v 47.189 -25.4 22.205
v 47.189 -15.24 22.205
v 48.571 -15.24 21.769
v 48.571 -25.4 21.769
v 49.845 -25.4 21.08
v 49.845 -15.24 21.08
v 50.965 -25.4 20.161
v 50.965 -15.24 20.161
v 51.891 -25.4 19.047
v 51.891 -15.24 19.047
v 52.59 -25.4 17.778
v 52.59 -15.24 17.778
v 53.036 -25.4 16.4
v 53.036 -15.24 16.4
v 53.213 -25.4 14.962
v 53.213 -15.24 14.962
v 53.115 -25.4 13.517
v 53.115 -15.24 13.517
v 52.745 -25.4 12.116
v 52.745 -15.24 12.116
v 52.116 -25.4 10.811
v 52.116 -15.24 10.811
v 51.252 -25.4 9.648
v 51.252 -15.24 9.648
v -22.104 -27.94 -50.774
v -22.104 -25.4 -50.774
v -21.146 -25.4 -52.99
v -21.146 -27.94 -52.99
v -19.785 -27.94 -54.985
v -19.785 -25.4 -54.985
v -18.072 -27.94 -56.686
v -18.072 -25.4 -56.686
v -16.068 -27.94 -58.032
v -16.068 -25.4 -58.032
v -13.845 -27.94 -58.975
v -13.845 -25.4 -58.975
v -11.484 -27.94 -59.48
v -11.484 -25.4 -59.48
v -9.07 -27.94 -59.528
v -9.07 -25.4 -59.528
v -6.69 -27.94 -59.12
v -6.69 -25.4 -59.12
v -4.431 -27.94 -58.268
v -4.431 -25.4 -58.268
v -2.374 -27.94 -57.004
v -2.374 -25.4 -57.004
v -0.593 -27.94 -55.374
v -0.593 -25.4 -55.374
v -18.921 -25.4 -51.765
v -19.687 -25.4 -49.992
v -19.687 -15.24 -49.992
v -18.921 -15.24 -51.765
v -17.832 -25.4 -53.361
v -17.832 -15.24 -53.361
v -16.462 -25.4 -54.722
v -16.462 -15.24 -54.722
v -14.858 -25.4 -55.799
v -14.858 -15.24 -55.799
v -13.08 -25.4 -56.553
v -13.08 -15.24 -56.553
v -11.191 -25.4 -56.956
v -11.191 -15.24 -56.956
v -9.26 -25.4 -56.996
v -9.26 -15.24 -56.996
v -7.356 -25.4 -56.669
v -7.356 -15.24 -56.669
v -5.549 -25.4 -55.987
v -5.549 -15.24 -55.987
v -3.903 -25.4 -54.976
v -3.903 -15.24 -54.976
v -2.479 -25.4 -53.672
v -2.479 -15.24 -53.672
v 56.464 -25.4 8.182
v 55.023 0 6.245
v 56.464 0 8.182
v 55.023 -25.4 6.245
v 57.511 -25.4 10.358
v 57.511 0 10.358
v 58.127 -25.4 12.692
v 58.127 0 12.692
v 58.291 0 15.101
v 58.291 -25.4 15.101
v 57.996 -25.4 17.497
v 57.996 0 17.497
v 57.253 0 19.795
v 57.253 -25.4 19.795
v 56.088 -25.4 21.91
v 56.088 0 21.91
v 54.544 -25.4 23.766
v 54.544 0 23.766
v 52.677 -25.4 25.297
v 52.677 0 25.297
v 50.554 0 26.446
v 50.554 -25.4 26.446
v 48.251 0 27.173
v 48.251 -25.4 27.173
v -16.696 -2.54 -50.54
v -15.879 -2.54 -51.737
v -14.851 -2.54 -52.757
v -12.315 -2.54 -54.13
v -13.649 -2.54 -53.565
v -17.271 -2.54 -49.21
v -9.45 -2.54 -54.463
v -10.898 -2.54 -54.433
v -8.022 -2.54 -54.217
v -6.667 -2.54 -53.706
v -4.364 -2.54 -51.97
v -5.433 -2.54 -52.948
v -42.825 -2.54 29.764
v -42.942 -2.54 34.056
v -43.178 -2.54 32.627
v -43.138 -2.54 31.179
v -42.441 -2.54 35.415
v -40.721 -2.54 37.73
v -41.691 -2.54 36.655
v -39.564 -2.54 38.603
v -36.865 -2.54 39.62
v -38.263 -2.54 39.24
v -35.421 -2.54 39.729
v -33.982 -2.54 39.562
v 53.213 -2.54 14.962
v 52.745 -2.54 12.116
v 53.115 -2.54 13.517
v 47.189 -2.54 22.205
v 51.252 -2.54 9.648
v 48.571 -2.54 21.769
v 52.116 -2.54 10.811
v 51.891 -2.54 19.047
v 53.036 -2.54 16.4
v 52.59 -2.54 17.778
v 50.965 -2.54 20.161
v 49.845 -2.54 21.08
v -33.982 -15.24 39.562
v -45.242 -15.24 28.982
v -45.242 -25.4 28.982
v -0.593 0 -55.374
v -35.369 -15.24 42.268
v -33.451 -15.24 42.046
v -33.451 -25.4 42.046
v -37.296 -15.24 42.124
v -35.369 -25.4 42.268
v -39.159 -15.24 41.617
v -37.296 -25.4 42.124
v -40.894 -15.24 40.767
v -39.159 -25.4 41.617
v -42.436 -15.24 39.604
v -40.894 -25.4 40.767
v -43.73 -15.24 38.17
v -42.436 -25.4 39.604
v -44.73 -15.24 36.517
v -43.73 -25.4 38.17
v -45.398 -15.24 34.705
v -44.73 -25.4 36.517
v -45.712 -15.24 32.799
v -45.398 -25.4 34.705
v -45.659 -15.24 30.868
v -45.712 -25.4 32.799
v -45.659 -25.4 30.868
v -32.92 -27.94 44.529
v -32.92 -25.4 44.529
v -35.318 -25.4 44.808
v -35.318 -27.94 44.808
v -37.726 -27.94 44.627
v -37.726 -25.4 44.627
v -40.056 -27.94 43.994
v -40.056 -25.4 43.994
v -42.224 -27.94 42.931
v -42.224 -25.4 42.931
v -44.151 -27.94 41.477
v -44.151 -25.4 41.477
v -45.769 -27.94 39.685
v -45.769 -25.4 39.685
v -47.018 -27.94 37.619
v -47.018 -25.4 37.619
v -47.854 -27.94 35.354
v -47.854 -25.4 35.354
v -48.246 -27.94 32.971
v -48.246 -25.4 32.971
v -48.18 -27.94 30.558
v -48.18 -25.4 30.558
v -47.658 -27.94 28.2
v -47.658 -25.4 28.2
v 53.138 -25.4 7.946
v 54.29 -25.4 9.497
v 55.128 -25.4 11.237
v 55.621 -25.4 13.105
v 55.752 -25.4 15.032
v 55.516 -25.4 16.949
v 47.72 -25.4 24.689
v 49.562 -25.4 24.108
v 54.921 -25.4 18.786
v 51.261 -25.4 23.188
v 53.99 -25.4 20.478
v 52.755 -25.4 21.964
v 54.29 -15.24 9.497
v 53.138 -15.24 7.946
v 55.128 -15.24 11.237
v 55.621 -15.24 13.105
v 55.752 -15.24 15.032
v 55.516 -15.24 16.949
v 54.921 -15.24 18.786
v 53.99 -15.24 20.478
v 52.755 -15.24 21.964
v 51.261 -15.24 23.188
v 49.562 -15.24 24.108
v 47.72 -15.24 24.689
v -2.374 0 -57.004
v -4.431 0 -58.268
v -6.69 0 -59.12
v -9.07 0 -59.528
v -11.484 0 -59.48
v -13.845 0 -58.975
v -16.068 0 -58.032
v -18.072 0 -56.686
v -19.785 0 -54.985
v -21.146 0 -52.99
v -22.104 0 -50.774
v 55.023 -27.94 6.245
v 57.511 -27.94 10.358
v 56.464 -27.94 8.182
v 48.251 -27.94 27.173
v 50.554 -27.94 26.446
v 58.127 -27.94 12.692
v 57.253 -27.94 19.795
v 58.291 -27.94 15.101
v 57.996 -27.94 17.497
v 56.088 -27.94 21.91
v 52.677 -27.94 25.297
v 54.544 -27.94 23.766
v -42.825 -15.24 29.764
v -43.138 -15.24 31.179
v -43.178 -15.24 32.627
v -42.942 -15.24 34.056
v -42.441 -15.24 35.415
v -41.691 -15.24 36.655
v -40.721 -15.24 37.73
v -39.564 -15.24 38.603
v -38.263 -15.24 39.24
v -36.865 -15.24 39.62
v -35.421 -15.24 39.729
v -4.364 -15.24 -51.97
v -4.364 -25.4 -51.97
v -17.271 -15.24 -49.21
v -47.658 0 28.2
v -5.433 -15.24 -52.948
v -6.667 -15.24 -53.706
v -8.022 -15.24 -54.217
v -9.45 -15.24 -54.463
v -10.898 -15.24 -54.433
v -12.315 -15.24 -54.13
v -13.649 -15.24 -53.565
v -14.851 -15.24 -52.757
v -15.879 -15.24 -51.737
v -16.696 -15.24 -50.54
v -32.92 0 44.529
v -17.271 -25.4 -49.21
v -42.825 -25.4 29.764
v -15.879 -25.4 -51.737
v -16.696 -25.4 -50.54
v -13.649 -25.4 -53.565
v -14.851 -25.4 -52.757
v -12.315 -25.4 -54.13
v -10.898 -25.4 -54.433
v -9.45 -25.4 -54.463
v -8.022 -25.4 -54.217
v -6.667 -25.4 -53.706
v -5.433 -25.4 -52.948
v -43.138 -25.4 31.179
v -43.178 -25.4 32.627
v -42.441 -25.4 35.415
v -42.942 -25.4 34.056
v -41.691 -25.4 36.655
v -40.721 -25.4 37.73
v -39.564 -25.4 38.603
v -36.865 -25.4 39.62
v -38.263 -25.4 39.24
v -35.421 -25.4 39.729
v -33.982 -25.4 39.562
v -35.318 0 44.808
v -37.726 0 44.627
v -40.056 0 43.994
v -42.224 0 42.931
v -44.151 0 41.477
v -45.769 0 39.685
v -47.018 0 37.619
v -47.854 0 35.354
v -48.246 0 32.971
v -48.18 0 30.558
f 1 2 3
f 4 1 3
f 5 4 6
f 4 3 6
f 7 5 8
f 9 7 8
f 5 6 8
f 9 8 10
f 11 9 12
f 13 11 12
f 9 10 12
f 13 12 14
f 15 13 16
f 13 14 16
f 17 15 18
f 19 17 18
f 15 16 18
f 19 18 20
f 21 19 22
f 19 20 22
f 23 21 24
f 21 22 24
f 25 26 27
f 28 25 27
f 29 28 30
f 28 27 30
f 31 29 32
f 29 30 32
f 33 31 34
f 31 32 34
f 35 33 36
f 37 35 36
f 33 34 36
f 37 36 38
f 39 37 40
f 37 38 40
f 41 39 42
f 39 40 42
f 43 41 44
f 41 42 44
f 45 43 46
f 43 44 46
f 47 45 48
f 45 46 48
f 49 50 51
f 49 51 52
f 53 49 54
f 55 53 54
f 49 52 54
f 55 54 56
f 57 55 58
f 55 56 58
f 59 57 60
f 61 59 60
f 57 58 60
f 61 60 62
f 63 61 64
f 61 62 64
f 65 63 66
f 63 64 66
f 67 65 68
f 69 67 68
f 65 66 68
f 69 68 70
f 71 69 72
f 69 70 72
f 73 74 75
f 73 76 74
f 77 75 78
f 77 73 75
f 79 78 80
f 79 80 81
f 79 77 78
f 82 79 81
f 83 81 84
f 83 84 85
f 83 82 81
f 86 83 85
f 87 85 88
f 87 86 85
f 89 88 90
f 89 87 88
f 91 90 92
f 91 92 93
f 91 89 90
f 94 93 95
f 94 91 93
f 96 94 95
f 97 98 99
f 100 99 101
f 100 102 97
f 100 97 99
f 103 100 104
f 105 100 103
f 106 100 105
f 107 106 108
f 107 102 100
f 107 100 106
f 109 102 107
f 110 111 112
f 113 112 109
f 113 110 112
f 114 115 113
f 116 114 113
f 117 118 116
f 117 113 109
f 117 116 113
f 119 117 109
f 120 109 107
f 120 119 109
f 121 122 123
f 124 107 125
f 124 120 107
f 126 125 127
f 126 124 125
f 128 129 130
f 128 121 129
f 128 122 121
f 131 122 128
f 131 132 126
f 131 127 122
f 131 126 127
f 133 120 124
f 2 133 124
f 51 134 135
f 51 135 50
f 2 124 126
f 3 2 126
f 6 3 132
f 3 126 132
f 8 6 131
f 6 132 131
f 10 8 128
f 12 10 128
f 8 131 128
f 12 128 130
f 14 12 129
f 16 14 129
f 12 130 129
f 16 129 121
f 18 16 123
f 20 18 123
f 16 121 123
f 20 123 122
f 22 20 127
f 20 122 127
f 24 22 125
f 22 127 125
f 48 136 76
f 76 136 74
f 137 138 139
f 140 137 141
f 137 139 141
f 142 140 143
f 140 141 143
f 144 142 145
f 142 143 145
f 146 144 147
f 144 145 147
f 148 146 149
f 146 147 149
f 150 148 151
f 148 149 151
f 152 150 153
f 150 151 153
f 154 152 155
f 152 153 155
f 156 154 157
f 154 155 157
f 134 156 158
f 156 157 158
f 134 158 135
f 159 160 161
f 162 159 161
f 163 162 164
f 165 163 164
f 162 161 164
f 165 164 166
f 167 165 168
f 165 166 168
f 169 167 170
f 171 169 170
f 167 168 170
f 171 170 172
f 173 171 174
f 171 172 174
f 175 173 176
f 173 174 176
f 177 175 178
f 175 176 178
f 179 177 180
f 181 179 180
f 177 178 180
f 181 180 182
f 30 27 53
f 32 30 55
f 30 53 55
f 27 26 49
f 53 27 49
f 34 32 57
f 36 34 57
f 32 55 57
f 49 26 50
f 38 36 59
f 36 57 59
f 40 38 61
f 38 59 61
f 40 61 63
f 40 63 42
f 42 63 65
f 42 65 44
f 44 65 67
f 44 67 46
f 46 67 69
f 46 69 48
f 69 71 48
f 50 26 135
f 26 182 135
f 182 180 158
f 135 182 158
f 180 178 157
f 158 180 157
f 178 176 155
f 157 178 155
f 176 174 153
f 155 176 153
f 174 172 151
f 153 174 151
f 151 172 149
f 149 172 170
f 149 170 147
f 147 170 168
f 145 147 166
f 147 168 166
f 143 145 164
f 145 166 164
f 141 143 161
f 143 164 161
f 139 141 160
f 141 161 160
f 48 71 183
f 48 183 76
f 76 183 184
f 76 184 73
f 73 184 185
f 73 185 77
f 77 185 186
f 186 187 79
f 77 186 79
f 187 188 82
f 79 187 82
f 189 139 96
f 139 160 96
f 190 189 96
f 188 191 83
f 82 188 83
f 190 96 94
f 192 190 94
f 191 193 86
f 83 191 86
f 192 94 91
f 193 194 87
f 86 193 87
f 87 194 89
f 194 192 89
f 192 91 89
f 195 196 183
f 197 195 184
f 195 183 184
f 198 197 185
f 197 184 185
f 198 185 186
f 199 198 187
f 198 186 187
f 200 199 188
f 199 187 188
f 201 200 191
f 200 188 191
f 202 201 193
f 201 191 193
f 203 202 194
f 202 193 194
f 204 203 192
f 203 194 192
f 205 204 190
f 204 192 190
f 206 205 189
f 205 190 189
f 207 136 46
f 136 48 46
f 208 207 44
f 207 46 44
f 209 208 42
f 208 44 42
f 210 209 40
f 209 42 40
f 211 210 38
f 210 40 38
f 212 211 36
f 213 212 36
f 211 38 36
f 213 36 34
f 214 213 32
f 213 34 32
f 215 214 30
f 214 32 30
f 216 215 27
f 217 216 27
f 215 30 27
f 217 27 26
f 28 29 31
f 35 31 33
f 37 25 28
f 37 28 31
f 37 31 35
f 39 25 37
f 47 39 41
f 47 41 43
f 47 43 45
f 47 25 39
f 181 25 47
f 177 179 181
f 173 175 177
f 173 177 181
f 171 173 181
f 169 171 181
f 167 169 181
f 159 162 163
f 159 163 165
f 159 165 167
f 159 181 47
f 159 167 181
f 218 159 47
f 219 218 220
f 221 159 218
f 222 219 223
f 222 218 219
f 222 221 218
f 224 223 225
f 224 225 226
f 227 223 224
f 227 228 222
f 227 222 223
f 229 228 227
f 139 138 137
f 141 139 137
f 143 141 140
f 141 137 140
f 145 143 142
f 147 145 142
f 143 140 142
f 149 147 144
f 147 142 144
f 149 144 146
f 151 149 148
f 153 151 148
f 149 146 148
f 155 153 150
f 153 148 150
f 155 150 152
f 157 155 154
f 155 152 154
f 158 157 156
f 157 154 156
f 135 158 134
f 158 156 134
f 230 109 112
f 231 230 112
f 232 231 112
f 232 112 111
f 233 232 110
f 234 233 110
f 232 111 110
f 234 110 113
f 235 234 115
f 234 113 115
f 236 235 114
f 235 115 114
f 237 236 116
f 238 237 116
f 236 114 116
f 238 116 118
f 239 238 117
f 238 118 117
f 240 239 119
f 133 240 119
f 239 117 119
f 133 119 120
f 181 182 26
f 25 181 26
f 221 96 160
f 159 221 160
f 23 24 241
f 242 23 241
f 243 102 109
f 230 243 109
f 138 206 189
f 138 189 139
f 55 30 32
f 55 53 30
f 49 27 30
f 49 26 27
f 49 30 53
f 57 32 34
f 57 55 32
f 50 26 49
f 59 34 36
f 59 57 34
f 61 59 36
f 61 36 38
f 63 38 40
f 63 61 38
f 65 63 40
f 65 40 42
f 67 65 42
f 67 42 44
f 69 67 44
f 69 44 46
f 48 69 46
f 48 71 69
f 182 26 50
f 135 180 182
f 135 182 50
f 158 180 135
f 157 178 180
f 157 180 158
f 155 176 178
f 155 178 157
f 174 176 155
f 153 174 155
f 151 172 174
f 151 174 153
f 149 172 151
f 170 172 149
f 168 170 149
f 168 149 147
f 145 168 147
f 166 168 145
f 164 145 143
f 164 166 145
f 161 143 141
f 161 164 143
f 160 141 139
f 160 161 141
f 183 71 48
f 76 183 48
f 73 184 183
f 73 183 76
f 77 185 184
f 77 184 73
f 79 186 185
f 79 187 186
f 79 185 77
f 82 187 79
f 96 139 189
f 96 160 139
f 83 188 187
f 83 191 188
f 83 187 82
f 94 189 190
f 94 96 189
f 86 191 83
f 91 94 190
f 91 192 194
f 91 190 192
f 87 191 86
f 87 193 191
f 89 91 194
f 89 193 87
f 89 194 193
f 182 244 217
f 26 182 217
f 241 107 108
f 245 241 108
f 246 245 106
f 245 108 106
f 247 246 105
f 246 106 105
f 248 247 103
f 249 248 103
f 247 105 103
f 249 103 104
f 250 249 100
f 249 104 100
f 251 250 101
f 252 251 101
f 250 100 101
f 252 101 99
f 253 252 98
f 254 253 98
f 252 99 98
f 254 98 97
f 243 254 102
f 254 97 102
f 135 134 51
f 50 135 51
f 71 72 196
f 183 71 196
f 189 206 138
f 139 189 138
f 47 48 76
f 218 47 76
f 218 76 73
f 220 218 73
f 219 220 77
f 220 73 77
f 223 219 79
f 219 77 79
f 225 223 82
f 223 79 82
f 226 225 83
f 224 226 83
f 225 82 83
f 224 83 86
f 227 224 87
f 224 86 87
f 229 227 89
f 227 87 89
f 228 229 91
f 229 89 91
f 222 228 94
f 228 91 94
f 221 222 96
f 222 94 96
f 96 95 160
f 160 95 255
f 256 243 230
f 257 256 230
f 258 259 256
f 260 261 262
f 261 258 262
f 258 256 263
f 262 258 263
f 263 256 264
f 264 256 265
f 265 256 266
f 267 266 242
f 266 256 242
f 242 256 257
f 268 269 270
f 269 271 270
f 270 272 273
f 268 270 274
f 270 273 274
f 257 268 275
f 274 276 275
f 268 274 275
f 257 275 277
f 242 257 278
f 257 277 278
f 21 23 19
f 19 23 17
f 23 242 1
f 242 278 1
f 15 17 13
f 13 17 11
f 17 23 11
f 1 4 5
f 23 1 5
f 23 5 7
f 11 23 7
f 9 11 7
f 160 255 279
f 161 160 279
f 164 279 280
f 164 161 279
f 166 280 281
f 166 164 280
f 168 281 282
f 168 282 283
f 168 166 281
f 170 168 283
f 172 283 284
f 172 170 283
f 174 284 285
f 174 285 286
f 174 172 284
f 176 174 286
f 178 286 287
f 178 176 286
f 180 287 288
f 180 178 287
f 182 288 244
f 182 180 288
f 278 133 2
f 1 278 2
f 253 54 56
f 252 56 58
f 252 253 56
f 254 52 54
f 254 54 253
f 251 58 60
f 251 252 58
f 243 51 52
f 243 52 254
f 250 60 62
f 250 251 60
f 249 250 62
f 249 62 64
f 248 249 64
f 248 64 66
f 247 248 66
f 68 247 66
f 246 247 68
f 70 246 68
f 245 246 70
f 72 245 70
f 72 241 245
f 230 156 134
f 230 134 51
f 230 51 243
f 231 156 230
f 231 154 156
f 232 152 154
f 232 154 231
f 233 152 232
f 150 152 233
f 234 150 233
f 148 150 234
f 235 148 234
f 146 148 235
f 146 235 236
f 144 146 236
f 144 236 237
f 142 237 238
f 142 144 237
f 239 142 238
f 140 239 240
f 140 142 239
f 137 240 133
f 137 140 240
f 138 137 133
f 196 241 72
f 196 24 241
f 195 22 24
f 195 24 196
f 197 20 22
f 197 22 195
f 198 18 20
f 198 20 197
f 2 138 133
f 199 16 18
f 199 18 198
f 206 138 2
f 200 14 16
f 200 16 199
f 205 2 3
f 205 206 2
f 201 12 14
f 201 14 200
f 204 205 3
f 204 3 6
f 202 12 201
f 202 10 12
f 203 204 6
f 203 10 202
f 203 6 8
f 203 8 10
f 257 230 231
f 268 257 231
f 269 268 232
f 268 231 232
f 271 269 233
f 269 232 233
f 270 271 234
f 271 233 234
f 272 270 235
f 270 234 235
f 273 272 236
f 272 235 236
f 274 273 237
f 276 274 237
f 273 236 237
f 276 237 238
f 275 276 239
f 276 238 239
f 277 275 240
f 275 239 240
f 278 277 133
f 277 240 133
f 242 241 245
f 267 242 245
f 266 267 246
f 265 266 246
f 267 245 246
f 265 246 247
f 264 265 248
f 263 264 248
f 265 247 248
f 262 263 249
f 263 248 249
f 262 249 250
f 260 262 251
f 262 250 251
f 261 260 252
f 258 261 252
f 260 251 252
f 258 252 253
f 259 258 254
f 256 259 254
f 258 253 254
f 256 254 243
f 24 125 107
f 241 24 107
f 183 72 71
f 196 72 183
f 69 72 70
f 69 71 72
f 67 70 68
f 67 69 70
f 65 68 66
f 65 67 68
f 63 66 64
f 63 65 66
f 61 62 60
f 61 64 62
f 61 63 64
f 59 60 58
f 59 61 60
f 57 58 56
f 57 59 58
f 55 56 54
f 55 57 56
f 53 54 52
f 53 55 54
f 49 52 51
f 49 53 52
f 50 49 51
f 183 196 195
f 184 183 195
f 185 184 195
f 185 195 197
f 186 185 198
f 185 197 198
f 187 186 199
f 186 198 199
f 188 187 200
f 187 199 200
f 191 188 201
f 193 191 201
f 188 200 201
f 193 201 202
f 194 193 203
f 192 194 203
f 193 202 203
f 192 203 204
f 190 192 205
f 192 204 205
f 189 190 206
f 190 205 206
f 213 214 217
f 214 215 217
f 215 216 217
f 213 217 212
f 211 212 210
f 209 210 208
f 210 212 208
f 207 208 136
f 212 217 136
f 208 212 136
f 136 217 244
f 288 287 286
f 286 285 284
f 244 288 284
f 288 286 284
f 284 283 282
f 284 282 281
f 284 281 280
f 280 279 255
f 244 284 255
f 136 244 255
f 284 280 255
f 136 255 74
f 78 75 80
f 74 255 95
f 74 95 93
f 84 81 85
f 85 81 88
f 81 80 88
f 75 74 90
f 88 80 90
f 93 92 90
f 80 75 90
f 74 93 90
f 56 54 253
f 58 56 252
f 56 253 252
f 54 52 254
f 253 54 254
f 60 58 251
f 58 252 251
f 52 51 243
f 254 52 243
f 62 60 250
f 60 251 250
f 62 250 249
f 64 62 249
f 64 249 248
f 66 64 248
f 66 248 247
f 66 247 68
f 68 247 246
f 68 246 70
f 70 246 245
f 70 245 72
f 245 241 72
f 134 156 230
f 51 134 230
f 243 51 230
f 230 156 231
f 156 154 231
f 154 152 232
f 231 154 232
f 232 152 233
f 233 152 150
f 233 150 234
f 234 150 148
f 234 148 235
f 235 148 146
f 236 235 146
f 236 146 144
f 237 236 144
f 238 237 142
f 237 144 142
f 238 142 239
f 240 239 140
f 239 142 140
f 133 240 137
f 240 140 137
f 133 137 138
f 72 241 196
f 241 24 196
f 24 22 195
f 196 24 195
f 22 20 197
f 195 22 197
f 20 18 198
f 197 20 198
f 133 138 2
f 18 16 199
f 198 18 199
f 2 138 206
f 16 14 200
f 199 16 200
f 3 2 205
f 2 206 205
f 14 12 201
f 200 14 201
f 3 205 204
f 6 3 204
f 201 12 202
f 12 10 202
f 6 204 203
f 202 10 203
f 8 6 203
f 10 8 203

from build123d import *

# Parameters (mm, degrees)
F0_DEPTH = 25.4
F1_R     = 12.7
F2_T     = -2.54
F4_DEPTH = 12.7
F7_DEPTH = 10.16
F9_DEPTH = 2.54


# Not quite as in the source:
# - a feature of the source that left no trace in its solid (it failed there, or was rolled back) is left out


with BuildPart() as f0:
    # F6 (on Front) → F0 (new body)
    with BuildSketch(Plane.XZ):
        Polygon((-15.3317583938, -71.7026534927), (69.7621986403, 22.5736344926), (-54.4304402465, 49.129019), align=None)
    extrude(amount=F0_DEPTH)

    # F1
    f1_edges = [f0.edges().sort_by_distance(p)[0] for p in [
        (69.762199, -12.7, 22.573634),
        (-15.331758, -12.7, -71.702653),
        (-54.43044, -12.7, 49.129019),
    ]]
    fillet(f1_edges, radius=F1_R)

    # F2
    f2_openings = [f0.faces().sort_by_distance(p)[0] for p in [
        (0, -25.4, 0),
    ]]
    offset(amount=F2_T, openings=f2_openings)

    # F3 (on face) → F4 (join)
    with BuildSketch(Plane.XZ.offset(2.54)):
        with BuildLine():
            ThreePointArc((-19.6872152917, -49.9920202635), (-12.1451122529, -56.7995368262), (-2.4785784535, -53.671642278))
            Line((-2.4785784535, -53.671642278), (53.1379671806, 7.9463815593))
            ThreePointArc((53.1379671806, 7.9463815593), (55.2623979412, 17.8817926703), (47.7202949023, 24.689309233))
            Line((47.7202949023, 24.689309233), (-33.4507518888, 42.0456387041))
            ThreePointArc((-33.4507518888, 42.0456387041), (-43.1172856883, 38.9177441559), (-45.2417164489, 28.982333045))
            Line((-45.2417164489, 28.982333045), (-19.6872152917, -49.9920202635))
        make_face()
        with BuildLine():
            Line((-17.2705818419, -49.2100466265), (-42.825082999, 29.7643066821))
            ThreePointArc((-42.825082999, 29.7643066821), (-41.2317599286, 37.2158650153), (-33.981859579, 39.5617859264))
            Line((-33.981859579, 39.5617859264), (47.1891872122, 22.2054564553))
            ThreePointArc((47.1891872122, 22.2054564553), (52.8457644913, 17.0998190332), (51.2524414209, 9.6482607))
            Line((51.2524414209, 9.6482607), (-4.3641042132, -51.9697631373))
            ThreePointArc((-4.3641042132, -51.9697631373), (-11.6140045628, -54.3156840485), (-17.2705818419, -49.2100466265))
        make_face(mode=Mode.SUBTRACT)
    extrude(amount=F4_DEPTH)


with BuildPart() as f7:
    # F7 (new): a face of the model
    f7_faces = [f0.part.faces().sort_by_distance(p)[0] for p in [
        (-11.8482246963, -15.24, -55.4110708034),
    ]]
    extrude(f7_faces, amount=F7_DEPTH)

    # F8 (on face) → F9 (join)
    with BuildSketch(Plane.XZ.offset(25.4)):
        with BuildLine():
            ThreePointArc((55.0234929403, 6.2445024187), (57.679031391, 18.6637663073), (48.2514025925, 27.1731620108))
            Line((48.2514025925, 27.1731620108), (-32.9196441987, 44.5294914819))
            ThreePointArc((-32.9196441987, 44.5294914819), (-45.002811448, 40.6196232966), (-47.6583498987, 28.200359408))
            Line((-47.6583498987, 28.200359408), (-22.1038487416, -50.7739939006))
            ThreePointArc((-22.1038487416, -50.7739939006), (-12.6762199431, -59.283389604), (-0.5930526938, -55.3735214187))
            Line((-0.5930526938, -55.3735214187), (55.0234929403, 6.2445024187))
        make_face()
    extrude(amount=F9_DEPTH)


solid = Compound([f0.part, f7.part])
